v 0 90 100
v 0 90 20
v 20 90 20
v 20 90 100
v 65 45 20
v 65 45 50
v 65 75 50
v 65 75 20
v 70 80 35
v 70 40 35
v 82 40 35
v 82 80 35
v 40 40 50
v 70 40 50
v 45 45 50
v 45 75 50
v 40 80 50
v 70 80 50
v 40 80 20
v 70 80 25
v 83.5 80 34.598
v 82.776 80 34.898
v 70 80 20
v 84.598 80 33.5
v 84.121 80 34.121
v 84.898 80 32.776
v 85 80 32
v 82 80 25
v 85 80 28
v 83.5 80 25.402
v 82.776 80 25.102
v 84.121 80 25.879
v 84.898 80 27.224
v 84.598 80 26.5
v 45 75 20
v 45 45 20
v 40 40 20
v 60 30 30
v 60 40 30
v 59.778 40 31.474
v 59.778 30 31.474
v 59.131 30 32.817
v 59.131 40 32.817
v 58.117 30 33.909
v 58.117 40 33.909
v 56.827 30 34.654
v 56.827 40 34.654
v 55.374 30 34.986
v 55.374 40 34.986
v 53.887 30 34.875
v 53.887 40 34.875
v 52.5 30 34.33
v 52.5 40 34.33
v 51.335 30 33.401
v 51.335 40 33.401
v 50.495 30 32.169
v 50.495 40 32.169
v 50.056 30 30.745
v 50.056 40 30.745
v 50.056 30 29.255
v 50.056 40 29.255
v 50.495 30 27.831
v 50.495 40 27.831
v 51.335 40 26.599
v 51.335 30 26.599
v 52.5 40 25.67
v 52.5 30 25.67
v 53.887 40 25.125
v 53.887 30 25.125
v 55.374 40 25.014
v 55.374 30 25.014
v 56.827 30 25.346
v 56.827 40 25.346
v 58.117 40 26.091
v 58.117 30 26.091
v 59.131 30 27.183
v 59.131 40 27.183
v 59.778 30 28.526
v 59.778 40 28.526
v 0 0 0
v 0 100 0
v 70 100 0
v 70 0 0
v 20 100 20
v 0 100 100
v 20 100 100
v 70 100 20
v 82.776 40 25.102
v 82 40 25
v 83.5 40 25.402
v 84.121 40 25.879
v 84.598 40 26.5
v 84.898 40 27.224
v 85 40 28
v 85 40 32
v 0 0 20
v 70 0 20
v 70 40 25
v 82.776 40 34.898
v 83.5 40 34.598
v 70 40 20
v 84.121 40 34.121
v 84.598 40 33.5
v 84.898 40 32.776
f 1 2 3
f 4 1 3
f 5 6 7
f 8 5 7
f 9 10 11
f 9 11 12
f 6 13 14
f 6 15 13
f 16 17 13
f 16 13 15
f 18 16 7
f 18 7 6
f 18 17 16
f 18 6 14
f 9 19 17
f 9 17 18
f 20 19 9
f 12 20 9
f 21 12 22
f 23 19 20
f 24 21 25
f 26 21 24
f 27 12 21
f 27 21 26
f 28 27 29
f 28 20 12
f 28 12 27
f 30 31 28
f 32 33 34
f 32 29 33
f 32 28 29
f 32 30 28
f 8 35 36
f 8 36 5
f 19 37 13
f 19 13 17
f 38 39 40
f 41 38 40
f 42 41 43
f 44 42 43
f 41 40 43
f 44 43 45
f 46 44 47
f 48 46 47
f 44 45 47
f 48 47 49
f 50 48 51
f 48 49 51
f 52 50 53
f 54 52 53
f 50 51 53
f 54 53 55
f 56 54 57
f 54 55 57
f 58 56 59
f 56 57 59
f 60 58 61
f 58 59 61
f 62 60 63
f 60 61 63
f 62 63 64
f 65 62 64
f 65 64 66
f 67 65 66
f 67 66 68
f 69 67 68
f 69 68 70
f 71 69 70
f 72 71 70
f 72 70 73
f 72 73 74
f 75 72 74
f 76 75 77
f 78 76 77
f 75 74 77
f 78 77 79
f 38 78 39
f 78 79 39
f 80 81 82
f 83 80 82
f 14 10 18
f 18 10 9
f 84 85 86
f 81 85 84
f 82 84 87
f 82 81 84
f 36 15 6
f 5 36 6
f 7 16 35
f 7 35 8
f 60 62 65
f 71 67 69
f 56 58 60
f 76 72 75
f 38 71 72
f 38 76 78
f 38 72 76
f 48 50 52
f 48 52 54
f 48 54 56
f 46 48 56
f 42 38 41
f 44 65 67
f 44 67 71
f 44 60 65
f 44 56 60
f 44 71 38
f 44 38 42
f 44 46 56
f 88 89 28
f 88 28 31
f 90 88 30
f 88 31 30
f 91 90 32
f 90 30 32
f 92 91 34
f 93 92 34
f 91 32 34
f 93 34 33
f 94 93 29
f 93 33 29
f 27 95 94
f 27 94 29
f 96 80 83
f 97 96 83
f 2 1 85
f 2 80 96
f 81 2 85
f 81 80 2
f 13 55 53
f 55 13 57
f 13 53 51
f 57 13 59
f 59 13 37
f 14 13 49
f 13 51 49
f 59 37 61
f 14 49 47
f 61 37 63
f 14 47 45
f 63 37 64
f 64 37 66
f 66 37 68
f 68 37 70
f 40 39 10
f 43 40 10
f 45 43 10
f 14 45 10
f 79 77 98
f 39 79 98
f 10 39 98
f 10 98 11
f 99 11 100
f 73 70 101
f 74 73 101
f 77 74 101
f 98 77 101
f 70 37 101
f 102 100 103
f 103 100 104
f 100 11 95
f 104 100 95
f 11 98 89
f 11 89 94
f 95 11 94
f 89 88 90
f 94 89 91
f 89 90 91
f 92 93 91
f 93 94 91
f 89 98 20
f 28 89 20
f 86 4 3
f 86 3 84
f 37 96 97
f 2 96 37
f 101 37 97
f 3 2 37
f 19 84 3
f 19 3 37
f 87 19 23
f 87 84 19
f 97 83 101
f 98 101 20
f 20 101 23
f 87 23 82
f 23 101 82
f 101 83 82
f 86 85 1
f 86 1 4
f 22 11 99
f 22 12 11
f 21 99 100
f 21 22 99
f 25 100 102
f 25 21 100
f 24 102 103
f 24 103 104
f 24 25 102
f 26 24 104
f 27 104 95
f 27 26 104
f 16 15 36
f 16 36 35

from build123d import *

# Parameters (mm, degrees)
F0_W      = 70
F0_H      = 100
F1_DEPTH  = 20
F2_W      = 20
F2_H      = 10
F3_DEPTH  = 80
F4_W      = 30
F4_H      = 40
F5_DEPTH  = 30
F6_W      = 20
F6_H      = 30
F7_DEPTH  = 30
F8_W      = 40
F8_H      = 10
F9_DEPTH  = 15
F10_R     = 5
F11_DEPTH = 10
F12_R     = 3


with BuildPart() as f1:
    # F0 (on Top) → F1 (new body)
    with BuildSketch(Plane.XY):
        with Locations((35, 50)):
            Rectangle(F0_W, F0_H)
    extrude(amount=F1_DEPTH)

    # F2 (on face) → F3 (join)
    with BuildSketch(Plane.XY.offset(20)):
        with Locations((10, 95)):
            Rectangle(F2_W, F2_H)
    extrude(amount=F3_DEPTH)

    # F4 (on face) → F5 (join)
    with BuildSketch(Plane.XY.offset(20)):
        with Locations((55, 60)):
            Rectangle(F4_W, F4_H)
    extrude(amount=F5_DEPTH)

    # F6 (on face) → F7 (cut)
    with BuildSketch(Plane.XY.offset(50)):
        with Locations((55, 60)):
            Rectangle(F6_W, F6_H)
    extrude(amount=-F7_DEPTH, mode=Mode.SUBTRACT)

    # F8 (on face) → F9 (join)
    with BuildSketch(Plane.YZ.offset(70)):
        with Locations((60, 30)):
            Rectangle(F8_W, F8_H)
    extrude(amount=F9_DEPTH)

    # F10 (on face) → F11 (join)
    with BuildSketch(Plane.XZ.offset(-40)):
        with Locations((55, 30)):
            Circle(F10_R)
    extrude(amount=F11_DEPTH)

    # F12
    f12_edges = [f1.edges().sort_by_distance(p)[0] for p in [
        (85, 60, 35),
        (85, 60, 25),
    ]]
    fillet(f12_edges, radius=F12_R)


solid = f1.part
